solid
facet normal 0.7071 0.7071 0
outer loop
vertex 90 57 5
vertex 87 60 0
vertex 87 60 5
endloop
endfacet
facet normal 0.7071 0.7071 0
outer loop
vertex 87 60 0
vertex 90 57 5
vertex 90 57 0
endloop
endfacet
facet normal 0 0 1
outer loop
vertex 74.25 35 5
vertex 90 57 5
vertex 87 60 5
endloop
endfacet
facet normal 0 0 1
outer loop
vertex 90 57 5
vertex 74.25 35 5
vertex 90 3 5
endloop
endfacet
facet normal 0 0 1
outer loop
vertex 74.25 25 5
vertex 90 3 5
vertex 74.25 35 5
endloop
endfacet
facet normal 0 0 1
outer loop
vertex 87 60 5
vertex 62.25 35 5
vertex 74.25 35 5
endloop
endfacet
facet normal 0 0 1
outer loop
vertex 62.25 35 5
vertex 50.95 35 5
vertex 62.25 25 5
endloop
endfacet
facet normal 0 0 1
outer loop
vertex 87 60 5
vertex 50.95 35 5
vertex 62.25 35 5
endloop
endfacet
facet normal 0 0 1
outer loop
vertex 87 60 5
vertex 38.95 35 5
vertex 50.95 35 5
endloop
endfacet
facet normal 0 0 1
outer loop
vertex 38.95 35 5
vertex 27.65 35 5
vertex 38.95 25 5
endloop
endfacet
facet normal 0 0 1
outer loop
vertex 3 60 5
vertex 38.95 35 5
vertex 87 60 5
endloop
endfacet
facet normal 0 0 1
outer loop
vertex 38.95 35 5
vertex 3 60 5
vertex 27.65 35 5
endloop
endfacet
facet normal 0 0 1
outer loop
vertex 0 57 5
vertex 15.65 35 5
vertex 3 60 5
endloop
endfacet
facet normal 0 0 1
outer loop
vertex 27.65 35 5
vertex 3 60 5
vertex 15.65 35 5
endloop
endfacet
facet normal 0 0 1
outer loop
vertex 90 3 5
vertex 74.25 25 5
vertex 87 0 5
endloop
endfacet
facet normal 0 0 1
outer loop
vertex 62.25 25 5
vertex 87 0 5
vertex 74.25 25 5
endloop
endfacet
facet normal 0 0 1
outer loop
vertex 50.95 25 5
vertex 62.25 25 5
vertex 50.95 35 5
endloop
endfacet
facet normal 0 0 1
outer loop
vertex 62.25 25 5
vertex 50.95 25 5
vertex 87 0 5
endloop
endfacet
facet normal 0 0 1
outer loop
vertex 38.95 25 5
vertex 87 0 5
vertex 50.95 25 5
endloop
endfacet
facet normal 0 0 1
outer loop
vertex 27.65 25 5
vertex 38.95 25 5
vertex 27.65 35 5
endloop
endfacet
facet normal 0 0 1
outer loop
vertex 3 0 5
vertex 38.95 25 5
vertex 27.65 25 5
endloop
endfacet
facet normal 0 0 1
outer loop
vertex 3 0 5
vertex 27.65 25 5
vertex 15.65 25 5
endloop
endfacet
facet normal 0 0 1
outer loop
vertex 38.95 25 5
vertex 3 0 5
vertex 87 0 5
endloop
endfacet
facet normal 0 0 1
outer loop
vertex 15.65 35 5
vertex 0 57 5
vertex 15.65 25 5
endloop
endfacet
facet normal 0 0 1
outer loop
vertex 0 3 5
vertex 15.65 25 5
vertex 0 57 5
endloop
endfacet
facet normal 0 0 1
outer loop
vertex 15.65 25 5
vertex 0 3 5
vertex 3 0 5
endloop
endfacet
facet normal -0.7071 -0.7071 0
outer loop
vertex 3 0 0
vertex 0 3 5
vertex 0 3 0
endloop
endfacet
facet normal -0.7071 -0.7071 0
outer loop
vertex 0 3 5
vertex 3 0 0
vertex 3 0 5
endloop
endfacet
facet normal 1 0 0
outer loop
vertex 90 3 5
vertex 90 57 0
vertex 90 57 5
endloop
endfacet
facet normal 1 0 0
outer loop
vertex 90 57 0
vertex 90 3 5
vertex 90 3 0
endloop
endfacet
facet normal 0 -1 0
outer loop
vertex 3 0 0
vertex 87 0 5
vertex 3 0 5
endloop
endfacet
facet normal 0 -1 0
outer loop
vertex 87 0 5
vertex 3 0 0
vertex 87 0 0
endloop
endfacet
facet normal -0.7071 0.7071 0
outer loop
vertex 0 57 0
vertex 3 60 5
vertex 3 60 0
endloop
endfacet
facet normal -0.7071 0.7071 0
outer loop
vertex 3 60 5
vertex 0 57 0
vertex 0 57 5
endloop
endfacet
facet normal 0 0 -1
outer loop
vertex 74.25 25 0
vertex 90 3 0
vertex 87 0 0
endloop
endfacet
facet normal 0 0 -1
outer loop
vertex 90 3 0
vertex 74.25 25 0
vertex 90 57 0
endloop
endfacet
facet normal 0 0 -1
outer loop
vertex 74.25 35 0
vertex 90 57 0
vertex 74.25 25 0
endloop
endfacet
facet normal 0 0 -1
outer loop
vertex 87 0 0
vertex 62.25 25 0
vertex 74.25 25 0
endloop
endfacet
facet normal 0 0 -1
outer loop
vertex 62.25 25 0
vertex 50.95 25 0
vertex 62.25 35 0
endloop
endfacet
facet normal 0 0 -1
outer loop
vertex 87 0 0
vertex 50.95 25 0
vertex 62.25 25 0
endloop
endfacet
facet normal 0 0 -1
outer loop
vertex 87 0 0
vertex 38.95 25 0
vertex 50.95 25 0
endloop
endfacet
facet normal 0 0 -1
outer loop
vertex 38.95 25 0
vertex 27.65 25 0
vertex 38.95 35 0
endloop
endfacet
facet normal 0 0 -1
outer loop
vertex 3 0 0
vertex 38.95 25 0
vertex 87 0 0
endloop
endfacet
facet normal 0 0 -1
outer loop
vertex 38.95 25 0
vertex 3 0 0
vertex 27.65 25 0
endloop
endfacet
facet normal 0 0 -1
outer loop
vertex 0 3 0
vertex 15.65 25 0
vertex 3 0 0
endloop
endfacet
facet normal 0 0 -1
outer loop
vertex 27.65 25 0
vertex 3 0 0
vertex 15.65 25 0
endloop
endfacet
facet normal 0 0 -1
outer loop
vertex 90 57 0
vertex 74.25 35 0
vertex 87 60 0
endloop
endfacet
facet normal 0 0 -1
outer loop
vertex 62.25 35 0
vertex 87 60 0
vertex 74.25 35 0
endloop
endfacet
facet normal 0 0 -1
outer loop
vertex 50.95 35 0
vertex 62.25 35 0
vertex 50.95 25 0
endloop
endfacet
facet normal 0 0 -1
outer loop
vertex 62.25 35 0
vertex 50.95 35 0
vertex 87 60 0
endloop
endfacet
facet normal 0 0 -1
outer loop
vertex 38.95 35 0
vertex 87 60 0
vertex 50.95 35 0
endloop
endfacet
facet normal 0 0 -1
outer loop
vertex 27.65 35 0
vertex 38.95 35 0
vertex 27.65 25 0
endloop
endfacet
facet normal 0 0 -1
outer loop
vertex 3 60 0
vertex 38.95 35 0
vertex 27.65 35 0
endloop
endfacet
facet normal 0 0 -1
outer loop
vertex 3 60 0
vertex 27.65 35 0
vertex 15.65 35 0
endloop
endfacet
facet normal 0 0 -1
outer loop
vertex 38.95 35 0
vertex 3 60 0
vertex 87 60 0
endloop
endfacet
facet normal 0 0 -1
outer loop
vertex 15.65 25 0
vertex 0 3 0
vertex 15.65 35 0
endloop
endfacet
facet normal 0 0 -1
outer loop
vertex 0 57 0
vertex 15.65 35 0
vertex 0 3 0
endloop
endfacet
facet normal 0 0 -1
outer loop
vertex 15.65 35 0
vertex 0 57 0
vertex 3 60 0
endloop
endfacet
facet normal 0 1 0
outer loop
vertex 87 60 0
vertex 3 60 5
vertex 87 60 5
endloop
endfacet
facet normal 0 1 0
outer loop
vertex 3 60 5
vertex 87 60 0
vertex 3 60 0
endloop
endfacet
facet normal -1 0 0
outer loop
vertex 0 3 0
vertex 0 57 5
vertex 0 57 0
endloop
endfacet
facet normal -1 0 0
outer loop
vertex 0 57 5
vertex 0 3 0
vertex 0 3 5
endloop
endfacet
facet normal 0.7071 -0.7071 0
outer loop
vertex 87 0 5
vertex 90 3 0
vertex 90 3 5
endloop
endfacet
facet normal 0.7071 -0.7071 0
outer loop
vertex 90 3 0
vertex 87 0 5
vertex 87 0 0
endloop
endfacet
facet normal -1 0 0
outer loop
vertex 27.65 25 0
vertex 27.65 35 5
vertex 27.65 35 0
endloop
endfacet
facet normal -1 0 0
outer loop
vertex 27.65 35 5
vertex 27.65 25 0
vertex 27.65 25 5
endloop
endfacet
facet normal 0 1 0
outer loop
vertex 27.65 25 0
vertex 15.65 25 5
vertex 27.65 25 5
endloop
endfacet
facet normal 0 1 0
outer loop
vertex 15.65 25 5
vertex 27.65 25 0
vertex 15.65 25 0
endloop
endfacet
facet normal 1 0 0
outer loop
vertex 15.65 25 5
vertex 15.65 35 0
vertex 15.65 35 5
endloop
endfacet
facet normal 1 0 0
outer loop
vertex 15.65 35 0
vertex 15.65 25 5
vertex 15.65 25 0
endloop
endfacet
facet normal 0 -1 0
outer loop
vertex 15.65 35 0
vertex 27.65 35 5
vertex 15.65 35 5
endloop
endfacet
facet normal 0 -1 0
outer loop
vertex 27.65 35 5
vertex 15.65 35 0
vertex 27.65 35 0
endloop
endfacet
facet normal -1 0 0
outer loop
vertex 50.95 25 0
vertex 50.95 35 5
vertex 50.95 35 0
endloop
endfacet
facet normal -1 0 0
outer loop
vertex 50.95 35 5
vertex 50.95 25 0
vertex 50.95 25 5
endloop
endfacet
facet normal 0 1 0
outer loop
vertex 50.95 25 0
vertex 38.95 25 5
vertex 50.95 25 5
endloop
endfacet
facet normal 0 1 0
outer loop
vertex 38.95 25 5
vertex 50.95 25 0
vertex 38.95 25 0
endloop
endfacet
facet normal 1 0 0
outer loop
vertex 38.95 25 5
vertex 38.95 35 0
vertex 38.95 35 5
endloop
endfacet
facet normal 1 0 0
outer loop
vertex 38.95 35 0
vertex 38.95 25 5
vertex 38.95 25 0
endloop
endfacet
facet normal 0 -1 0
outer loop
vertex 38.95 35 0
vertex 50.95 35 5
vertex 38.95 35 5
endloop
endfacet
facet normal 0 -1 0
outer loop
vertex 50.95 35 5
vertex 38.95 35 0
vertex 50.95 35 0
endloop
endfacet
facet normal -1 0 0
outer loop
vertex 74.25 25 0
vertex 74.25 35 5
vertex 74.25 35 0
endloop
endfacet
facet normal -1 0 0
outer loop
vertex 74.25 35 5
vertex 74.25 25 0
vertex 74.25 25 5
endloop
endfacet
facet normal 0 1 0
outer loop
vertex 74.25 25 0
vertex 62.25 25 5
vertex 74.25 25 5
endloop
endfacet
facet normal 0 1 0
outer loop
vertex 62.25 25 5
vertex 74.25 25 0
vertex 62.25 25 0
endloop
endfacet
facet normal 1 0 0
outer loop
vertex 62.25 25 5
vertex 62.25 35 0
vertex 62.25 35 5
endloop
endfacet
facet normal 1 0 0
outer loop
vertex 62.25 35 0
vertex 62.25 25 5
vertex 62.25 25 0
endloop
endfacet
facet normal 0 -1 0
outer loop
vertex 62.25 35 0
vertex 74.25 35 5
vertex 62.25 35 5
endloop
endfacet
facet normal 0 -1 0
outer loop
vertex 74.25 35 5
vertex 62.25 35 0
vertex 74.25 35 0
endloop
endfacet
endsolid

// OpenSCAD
$fn = 32;

// ----------------------------------------------------------------------
// Windowed plate: 3 voids, 90 x 60 x 5 mm
// ----------------------------------------------------------------------

// --- parameters (mm) ---
plate_l = 90;             // plate length, X
plate_w = 60;             // plate width, Y
plate_t = 5;              // plate thickness, Z
edge_margin = 10;         // wall from the plate edge to any window
windows = 3;              // number of windows in the row
win_l = 12;               // window length
win_w = 10;               // window width
win_pitch = 23.3;         // window pitch along X
depth_1 = 5;              // depth of void 1 (full thickness = through)
depth_2 = 5;              // depth of void 2 (full thickness = through)
depth_3 = 5;              // depth of void 3 (full thickness = through)
corner_c = 3;             // corner chamfer of the plate

profile = [[3, 0], [87, 0], [90, 3], [90, 57], [87, 60], [3, 60], [0, 57], [0, 3]];  // primary outline, 8 points, counter clockwise
void_1 = [[15.65, 25], [27.65, 25], [27.65, 35], [15.65, 35]];  // window 1 of the row, 4 points
void_2 = [[38.95, 25], [50.95, 25], [50.95, 35], [38.95, 35]];  // window 2 of the row, 4 points
void_3 = [[62.25, 25], [74.25, 25], [74.25, 35], [62.25, 35]];  // window 3 of the row, 4 points

// --- the one profile operation ---
difference() {
  linear_extrude(height = plate_t) polygon(points = profile);
  translate([0, 0, -1])
    linear_extrude(height = plate_t + 2) polygon(points = void_1);
  translate([0, 0, -1])
    linear_extrude(height = plate_t + 2) polygon(points = void_2);
  translate([0, 0, -1])
    linear_extrude(height = plate_t + 2) polygon(points = void_3);
}
